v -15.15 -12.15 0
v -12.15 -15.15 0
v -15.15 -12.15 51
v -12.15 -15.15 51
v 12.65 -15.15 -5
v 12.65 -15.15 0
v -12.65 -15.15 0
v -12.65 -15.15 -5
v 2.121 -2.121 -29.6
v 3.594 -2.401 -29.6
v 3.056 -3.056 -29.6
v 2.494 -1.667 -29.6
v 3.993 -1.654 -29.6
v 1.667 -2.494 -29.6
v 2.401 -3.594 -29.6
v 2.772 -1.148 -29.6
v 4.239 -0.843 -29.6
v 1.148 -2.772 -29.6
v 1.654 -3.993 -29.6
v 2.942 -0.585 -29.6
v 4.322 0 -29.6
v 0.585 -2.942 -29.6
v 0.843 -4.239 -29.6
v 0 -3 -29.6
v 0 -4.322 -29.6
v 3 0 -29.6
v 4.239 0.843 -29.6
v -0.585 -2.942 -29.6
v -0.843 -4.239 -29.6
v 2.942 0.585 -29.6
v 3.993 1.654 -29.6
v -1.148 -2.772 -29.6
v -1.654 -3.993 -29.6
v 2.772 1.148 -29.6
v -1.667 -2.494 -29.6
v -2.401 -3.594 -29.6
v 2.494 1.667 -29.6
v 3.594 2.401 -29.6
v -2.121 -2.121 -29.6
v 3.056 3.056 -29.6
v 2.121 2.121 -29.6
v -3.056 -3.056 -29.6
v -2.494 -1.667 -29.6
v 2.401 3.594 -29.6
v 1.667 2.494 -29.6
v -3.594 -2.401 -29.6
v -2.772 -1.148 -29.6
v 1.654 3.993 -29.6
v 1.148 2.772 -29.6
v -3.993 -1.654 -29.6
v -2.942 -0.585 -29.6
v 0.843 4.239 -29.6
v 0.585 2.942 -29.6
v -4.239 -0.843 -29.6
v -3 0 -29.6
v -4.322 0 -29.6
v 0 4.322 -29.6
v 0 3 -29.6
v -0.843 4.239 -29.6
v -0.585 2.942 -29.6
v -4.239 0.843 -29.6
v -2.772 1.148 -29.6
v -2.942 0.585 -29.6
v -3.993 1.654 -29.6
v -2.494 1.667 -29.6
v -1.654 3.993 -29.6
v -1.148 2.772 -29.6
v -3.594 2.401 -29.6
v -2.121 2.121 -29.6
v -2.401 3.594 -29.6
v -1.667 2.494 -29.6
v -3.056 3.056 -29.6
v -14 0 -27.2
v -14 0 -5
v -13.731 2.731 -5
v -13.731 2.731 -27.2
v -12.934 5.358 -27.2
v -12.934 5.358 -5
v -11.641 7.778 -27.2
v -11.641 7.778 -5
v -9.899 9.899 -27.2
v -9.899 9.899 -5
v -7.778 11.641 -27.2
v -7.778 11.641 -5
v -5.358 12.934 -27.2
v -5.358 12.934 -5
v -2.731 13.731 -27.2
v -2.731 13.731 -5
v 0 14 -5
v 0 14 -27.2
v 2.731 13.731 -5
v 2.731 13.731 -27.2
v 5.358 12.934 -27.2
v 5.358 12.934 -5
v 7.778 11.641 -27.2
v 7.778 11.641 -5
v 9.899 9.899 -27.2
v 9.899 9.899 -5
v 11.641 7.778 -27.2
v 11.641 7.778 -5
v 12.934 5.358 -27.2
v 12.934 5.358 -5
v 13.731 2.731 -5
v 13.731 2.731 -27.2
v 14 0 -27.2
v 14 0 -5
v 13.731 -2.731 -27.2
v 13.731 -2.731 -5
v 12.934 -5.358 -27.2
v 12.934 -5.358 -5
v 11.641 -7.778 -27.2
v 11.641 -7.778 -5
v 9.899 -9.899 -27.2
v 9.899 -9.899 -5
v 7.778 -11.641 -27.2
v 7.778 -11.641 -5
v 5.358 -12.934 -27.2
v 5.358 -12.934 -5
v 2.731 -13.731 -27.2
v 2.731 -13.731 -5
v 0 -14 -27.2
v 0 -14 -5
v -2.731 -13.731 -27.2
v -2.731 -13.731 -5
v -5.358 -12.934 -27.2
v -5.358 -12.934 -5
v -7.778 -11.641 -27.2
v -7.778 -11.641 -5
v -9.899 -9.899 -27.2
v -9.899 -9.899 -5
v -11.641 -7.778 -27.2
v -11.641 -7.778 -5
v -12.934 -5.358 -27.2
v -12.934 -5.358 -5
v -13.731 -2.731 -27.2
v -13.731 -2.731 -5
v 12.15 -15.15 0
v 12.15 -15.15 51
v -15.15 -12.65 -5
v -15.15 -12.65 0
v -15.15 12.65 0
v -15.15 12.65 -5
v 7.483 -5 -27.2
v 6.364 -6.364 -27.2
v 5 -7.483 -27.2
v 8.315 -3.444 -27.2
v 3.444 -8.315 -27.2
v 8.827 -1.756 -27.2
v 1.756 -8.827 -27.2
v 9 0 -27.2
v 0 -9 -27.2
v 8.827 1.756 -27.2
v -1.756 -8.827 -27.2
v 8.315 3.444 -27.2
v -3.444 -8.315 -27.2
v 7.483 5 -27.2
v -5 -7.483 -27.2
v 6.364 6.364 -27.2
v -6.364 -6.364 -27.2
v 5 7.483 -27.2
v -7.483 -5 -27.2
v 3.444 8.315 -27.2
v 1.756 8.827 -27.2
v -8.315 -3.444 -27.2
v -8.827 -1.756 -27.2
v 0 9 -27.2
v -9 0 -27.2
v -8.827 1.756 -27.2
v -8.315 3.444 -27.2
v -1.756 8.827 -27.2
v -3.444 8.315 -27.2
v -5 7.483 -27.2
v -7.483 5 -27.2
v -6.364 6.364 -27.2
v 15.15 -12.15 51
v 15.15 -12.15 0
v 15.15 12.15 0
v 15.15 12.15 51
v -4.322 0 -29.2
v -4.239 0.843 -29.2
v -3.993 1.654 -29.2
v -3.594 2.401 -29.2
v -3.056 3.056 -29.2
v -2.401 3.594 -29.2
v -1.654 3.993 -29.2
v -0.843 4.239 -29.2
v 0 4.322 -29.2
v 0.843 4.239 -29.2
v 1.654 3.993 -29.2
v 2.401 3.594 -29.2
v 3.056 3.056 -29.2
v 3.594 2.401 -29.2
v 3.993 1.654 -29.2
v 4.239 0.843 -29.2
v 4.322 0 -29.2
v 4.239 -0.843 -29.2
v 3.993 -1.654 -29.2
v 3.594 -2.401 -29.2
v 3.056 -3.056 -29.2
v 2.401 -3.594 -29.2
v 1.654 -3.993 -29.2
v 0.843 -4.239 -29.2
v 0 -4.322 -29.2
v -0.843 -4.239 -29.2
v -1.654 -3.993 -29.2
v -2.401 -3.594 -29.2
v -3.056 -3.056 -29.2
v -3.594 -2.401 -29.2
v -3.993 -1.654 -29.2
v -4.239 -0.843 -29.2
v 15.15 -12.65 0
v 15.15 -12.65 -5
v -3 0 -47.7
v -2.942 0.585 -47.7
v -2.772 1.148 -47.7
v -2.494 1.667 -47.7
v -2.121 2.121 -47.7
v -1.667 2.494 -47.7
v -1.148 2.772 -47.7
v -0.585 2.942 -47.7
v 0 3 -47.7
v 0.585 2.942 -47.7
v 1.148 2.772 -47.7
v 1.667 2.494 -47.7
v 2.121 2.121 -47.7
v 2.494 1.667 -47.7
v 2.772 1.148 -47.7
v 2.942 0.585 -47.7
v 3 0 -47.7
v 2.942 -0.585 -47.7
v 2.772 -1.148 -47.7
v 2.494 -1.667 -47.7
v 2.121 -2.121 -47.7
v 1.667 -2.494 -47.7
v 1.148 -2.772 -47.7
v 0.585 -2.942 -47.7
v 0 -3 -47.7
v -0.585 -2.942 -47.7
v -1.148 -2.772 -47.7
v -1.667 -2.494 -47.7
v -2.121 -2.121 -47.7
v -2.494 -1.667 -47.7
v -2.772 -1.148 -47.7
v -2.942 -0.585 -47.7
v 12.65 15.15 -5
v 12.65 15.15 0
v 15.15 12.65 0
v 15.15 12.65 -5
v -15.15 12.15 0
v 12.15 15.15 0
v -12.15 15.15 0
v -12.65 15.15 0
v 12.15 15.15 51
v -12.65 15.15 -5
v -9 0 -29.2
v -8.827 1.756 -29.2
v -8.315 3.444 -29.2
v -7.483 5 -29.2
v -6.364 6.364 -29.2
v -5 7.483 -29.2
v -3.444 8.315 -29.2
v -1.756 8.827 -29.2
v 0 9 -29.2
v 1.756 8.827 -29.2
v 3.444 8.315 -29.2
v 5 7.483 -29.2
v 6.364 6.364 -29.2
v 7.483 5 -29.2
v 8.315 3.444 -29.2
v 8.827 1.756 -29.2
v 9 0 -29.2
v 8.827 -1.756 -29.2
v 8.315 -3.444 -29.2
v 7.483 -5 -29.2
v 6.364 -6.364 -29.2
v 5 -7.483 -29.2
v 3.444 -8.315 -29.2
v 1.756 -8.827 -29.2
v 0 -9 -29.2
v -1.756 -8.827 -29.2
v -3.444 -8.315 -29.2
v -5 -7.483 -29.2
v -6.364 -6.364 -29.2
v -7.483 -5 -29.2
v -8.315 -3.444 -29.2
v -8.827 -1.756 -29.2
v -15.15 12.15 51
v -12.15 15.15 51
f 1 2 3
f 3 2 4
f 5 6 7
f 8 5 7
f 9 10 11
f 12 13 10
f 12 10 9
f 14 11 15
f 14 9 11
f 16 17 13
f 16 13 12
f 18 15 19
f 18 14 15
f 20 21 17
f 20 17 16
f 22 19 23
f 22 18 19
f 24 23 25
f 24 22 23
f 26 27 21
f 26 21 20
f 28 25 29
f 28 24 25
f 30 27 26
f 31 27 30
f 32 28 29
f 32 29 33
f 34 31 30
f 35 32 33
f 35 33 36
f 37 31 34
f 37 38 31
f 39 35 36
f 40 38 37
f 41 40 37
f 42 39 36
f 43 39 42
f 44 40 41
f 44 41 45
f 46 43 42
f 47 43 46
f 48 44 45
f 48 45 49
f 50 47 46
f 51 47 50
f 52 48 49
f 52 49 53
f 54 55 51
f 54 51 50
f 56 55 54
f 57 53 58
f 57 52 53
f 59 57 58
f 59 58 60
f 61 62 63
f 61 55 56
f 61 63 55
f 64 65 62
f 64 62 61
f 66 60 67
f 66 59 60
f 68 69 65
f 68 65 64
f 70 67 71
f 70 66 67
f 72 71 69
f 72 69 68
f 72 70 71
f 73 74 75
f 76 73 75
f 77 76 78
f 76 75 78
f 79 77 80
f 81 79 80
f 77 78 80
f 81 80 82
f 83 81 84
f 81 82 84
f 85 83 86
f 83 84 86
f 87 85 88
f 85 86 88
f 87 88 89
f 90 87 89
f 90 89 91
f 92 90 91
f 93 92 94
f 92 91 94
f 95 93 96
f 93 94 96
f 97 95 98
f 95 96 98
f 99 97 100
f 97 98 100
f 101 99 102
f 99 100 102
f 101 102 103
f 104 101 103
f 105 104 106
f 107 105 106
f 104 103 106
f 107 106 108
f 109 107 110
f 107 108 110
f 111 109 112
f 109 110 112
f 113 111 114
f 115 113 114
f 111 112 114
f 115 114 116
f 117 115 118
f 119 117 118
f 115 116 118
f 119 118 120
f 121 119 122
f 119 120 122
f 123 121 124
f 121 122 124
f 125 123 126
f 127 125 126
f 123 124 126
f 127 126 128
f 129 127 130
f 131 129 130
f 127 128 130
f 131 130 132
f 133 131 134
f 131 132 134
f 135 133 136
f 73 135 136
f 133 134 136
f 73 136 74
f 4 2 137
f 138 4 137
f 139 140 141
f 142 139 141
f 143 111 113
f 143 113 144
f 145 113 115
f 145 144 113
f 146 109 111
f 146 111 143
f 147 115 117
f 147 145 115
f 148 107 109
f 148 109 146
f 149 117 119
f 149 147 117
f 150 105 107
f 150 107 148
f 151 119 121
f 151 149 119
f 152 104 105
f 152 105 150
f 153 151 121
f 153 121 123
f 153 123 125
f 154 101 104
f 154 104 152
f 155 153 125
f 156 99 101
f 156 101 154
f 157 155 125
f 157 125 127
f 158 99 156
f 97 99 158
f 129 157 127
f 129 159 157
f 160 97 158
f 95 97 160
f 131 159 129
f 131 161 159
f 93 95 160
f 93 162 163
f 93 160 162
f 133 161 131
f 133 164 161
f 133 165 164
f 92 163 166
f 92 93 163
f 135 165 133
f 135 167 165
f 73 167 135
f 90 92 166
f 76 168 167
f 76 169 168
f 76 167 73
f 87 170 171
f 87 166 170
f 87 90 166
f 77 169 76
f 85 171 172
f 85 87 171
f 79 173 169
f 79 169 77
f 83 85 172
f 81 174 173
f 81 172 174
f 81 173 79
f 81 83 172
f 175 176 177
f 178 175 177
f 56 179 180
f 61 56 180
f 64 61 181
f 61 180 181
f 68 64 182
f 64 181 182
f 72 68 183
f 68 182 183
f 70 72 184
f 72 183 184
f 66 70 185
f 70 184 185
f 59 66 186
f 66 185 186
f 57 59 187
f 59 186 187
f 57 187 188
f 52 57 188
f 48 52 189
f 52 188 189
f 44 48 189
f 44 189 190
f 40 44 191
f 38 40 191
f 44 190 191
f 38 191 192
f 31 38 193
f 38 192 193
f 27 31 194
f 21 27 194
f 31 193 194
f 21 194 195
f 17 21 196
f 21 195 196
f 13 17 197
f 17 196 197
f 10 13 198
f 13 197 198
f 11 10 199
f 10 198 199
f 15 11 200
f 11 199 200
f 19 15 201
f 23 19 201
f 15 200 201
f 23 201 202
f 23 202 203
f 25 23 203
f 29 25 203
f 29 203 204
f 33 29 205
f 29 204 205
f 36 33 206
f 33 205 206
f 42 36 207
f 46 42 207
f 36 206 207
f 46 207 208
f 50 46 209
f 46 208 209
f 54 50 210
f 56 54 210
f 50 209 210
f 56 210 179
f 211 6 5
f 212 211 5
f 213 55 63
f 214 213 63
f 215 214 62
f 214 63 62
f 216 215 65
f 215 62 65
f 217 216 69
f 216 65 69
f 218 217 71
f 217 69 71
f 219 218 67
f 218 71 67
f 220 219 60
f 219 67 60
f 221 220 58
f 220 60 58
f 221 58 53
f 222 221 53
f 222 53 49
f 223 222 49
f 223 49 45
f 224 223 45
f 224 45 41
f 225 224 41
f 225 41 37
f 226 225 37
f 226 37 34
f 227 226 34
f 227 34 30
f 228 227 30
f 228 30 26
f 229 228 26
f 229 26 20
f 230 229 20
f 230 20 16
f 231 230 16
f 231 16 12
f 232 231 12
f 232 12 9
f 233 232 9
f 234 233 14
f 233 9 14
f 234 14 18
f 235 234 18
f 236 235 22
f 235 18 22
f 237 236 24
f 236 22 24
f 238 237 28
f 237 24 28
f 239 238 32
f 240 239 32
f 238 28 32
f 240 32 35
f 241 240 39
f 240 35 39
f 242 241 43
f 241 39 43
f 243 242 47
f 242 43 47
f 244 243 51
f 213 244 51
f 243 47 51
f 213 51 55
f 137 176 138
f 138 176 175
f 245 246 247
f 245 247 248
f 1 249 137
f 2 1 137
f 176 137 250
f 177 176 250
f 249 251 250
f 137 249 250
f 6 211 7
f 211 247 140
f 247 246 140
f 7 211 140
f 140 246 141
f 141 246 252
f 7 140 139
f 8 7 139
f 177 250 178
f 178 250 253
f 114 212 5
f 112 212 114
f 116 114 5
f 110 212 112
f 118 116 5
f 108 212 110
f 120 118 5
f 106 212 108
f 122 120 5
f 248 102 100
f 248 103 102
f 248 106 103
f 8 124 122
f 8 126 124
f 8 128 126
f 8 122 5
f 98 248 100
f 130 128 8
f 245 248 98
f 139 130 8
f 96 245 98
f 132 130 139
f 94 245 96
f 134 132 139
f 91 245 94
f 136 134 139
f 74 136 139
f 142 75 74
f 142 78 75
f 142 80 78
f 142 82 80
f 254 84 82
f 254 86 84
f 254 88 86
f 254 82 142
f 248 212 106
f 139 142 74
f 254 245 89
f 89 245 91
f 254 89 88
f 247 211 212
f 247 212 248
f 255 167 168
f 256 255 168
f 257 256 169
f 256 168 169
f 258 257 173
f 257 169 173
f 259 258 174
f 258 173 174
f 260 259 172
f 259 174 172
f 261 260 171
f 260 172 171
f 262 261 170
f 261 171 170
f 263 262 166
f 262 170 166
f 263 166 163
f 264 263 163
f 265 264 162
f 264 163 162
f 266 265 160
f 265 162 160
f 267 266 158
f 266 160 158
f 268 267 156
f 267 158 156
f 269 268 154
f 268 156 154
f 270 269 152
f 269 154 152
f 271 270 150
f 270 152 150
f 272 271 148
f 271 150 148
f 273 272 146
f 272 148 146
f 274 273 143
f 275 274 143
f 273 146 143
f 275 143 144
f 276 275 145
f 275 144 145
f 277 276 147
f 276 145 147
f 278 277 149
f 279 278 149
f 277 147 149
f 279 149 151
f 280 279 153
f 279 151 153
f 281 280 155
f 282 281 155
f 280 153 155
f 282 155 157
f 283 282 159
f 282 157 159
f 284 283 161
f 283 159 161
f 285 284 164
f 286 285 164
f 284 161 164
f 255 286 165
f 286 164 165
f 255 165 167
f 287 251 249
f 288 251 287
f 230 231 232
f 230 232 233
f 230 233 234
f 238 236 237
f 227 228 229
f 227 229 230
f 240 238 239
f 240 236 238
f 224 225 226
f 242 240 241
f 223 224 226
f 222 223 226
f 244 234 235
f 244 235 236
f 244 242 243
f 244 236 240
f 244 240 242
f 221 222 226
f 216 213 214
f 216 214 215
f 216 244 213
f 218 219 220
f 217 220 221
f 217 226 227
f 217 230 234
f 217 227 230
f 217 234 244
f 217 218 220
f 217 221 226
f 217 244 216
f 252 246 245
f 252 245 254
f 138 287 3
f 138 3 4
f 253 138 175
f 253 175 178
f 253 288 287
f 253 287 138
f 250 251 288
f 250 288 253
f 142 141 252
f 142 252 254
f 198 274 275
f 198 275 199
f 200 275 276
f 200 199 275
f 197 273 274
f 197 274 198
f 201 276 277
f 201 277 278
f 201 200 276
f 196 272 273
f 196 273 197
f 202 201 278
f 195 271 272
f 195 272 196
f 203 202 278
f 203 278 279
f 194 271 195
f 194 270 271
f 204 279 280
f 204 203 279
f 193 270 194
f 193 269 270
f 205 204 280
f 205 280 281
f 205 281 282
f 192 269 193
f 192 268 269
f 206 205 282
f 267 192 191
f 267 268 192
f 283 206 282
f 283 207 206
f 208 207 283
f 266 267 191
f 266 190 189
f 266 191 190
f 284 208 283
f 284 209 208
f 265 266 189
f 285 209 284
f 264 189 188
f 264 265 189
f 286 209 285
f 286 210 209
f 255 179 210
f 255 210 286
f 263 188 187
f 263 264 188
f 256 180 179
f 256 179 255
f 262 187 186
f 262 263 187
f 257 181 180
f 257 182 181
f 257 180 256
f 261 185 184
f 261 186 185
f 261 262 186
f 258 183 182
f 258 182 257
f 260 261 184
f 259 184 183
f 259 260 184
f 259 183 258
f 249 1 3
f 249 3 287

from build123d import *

# Parameters (mm, degrees)
SKETCH1_W           = 30.3
SKETCH1_H           = 30.3
BOSS_EXTRUDE1_DEPTH = 51
SKETCH4_W           = 30.3
SKETCH4_H           = 30.3
BOSS_EXTRUDE4_DEPTH = 5
SKETCH5_R           = 14
BOSS_EXTRUDE5_DEPTH = 22.2
SKETCH6_R           = 9
BOSS_EXTRUDE6_DEPTH = 2
SKETCH7_R           = 3
BOSS_EXTRUDE7_DEPTH = 18.5
SKETCH8_R           = 4.32234312
BOSS_EXTRUDE8_DEPTH = 0.4
CHAMFER1_SIZE       = 3
CHAMFER2_SIZE       = 2.5


with BuildPart() as part:
    # Sketch1 → Boss-Extrude1 (new body)
    with BuildSketch(Plane.XY):
        Rectangle(SKETCH1_W, SKETCH1_H)
    extrude(amount=BOSS_EXTRUDE1_DEPTH)

    # Chamfer1
    chamfer1_edges = [part.edges().sort_by_distance(p)[0] for p in [
        (15.15, -15.15, 25.5),
        (-15.15, -15.15, 25.5),
        (-15.15, 15.15, 25.5),
        (15.15, 15.15, 25.5),
    ]]
    chamfer(chamfer1_edges, length=CHAMFER1_SIZE)


with BuildPart() as body_2:
    # Sketch4 → Boss-Extrude4 (new body)
    with BuildSketch(Plane(origin=(0, 0, 0), x_dir=(-1, 0, 0), z_dir=(0, 0, -1))):
        Rectangle(SKETCH4_W, SKETCH4_H)
    extrude(amount=BOSS_EXTRUDE4_DEPTH)

    # Sketch5 → Boss-Extrude5 (add)
    with BuildSketch(Plane(origin=(0, 0, -5), x_dir=(-1, 0, 0), z_dir=(0, 0, -1))):
        Circle(SKETCH5_R)
    extrude(amount=BOSS_EXTRUDE5_DEPTH)

    # Sketch6 → Boss-Extrude6 (add)
    with BuildSketch(Plane(origin=(0, 0, -27.2), x_dir=(-1, 0, 0), z_dir=(0, 0, -1))):
        Circle(SKETCH6_R)
    extrude(amount=BOSS_EXTRUDE6_DEPTH)

    # Sketch7 → Boss-Extrude7 (add)
    with BuildSketch(Plane(origin=(0, 0, -29.2), x_dir=(-1, 0, 0), z_dir=(0, 0, -1))):
        Circle(SKETCH7_R)
    extrude(amount=BOSS_EXTRUDE7_DEPTH)

    # Sketch8 → Boss-Extrude8 (add)
    with BuildSketch(Plane(origin=(0, 0, -29.2), x_dir=(-1, 0, 0), z_dir=(0, 0, -1))):
        Circle(SKETCH8_R)
    extrude(amount=BOSS_EXTRUDE8_DEPTH)

    # Chamfer2
    chamfer2_edges = [body_2.edges().sort_by_distance(p)[0] for p in [
        (-15.15, -15.15, -2.5),
        (15.15, -15.15, -2.5),
        (15.15, 15.15, -2.5),
        (-15.15, 15.15, -2.5),
    ]]
    chamfer(chamfer2_edges, length=CHAMFER2_SIZE)


solid = Compound([part.part, body_2.part])
